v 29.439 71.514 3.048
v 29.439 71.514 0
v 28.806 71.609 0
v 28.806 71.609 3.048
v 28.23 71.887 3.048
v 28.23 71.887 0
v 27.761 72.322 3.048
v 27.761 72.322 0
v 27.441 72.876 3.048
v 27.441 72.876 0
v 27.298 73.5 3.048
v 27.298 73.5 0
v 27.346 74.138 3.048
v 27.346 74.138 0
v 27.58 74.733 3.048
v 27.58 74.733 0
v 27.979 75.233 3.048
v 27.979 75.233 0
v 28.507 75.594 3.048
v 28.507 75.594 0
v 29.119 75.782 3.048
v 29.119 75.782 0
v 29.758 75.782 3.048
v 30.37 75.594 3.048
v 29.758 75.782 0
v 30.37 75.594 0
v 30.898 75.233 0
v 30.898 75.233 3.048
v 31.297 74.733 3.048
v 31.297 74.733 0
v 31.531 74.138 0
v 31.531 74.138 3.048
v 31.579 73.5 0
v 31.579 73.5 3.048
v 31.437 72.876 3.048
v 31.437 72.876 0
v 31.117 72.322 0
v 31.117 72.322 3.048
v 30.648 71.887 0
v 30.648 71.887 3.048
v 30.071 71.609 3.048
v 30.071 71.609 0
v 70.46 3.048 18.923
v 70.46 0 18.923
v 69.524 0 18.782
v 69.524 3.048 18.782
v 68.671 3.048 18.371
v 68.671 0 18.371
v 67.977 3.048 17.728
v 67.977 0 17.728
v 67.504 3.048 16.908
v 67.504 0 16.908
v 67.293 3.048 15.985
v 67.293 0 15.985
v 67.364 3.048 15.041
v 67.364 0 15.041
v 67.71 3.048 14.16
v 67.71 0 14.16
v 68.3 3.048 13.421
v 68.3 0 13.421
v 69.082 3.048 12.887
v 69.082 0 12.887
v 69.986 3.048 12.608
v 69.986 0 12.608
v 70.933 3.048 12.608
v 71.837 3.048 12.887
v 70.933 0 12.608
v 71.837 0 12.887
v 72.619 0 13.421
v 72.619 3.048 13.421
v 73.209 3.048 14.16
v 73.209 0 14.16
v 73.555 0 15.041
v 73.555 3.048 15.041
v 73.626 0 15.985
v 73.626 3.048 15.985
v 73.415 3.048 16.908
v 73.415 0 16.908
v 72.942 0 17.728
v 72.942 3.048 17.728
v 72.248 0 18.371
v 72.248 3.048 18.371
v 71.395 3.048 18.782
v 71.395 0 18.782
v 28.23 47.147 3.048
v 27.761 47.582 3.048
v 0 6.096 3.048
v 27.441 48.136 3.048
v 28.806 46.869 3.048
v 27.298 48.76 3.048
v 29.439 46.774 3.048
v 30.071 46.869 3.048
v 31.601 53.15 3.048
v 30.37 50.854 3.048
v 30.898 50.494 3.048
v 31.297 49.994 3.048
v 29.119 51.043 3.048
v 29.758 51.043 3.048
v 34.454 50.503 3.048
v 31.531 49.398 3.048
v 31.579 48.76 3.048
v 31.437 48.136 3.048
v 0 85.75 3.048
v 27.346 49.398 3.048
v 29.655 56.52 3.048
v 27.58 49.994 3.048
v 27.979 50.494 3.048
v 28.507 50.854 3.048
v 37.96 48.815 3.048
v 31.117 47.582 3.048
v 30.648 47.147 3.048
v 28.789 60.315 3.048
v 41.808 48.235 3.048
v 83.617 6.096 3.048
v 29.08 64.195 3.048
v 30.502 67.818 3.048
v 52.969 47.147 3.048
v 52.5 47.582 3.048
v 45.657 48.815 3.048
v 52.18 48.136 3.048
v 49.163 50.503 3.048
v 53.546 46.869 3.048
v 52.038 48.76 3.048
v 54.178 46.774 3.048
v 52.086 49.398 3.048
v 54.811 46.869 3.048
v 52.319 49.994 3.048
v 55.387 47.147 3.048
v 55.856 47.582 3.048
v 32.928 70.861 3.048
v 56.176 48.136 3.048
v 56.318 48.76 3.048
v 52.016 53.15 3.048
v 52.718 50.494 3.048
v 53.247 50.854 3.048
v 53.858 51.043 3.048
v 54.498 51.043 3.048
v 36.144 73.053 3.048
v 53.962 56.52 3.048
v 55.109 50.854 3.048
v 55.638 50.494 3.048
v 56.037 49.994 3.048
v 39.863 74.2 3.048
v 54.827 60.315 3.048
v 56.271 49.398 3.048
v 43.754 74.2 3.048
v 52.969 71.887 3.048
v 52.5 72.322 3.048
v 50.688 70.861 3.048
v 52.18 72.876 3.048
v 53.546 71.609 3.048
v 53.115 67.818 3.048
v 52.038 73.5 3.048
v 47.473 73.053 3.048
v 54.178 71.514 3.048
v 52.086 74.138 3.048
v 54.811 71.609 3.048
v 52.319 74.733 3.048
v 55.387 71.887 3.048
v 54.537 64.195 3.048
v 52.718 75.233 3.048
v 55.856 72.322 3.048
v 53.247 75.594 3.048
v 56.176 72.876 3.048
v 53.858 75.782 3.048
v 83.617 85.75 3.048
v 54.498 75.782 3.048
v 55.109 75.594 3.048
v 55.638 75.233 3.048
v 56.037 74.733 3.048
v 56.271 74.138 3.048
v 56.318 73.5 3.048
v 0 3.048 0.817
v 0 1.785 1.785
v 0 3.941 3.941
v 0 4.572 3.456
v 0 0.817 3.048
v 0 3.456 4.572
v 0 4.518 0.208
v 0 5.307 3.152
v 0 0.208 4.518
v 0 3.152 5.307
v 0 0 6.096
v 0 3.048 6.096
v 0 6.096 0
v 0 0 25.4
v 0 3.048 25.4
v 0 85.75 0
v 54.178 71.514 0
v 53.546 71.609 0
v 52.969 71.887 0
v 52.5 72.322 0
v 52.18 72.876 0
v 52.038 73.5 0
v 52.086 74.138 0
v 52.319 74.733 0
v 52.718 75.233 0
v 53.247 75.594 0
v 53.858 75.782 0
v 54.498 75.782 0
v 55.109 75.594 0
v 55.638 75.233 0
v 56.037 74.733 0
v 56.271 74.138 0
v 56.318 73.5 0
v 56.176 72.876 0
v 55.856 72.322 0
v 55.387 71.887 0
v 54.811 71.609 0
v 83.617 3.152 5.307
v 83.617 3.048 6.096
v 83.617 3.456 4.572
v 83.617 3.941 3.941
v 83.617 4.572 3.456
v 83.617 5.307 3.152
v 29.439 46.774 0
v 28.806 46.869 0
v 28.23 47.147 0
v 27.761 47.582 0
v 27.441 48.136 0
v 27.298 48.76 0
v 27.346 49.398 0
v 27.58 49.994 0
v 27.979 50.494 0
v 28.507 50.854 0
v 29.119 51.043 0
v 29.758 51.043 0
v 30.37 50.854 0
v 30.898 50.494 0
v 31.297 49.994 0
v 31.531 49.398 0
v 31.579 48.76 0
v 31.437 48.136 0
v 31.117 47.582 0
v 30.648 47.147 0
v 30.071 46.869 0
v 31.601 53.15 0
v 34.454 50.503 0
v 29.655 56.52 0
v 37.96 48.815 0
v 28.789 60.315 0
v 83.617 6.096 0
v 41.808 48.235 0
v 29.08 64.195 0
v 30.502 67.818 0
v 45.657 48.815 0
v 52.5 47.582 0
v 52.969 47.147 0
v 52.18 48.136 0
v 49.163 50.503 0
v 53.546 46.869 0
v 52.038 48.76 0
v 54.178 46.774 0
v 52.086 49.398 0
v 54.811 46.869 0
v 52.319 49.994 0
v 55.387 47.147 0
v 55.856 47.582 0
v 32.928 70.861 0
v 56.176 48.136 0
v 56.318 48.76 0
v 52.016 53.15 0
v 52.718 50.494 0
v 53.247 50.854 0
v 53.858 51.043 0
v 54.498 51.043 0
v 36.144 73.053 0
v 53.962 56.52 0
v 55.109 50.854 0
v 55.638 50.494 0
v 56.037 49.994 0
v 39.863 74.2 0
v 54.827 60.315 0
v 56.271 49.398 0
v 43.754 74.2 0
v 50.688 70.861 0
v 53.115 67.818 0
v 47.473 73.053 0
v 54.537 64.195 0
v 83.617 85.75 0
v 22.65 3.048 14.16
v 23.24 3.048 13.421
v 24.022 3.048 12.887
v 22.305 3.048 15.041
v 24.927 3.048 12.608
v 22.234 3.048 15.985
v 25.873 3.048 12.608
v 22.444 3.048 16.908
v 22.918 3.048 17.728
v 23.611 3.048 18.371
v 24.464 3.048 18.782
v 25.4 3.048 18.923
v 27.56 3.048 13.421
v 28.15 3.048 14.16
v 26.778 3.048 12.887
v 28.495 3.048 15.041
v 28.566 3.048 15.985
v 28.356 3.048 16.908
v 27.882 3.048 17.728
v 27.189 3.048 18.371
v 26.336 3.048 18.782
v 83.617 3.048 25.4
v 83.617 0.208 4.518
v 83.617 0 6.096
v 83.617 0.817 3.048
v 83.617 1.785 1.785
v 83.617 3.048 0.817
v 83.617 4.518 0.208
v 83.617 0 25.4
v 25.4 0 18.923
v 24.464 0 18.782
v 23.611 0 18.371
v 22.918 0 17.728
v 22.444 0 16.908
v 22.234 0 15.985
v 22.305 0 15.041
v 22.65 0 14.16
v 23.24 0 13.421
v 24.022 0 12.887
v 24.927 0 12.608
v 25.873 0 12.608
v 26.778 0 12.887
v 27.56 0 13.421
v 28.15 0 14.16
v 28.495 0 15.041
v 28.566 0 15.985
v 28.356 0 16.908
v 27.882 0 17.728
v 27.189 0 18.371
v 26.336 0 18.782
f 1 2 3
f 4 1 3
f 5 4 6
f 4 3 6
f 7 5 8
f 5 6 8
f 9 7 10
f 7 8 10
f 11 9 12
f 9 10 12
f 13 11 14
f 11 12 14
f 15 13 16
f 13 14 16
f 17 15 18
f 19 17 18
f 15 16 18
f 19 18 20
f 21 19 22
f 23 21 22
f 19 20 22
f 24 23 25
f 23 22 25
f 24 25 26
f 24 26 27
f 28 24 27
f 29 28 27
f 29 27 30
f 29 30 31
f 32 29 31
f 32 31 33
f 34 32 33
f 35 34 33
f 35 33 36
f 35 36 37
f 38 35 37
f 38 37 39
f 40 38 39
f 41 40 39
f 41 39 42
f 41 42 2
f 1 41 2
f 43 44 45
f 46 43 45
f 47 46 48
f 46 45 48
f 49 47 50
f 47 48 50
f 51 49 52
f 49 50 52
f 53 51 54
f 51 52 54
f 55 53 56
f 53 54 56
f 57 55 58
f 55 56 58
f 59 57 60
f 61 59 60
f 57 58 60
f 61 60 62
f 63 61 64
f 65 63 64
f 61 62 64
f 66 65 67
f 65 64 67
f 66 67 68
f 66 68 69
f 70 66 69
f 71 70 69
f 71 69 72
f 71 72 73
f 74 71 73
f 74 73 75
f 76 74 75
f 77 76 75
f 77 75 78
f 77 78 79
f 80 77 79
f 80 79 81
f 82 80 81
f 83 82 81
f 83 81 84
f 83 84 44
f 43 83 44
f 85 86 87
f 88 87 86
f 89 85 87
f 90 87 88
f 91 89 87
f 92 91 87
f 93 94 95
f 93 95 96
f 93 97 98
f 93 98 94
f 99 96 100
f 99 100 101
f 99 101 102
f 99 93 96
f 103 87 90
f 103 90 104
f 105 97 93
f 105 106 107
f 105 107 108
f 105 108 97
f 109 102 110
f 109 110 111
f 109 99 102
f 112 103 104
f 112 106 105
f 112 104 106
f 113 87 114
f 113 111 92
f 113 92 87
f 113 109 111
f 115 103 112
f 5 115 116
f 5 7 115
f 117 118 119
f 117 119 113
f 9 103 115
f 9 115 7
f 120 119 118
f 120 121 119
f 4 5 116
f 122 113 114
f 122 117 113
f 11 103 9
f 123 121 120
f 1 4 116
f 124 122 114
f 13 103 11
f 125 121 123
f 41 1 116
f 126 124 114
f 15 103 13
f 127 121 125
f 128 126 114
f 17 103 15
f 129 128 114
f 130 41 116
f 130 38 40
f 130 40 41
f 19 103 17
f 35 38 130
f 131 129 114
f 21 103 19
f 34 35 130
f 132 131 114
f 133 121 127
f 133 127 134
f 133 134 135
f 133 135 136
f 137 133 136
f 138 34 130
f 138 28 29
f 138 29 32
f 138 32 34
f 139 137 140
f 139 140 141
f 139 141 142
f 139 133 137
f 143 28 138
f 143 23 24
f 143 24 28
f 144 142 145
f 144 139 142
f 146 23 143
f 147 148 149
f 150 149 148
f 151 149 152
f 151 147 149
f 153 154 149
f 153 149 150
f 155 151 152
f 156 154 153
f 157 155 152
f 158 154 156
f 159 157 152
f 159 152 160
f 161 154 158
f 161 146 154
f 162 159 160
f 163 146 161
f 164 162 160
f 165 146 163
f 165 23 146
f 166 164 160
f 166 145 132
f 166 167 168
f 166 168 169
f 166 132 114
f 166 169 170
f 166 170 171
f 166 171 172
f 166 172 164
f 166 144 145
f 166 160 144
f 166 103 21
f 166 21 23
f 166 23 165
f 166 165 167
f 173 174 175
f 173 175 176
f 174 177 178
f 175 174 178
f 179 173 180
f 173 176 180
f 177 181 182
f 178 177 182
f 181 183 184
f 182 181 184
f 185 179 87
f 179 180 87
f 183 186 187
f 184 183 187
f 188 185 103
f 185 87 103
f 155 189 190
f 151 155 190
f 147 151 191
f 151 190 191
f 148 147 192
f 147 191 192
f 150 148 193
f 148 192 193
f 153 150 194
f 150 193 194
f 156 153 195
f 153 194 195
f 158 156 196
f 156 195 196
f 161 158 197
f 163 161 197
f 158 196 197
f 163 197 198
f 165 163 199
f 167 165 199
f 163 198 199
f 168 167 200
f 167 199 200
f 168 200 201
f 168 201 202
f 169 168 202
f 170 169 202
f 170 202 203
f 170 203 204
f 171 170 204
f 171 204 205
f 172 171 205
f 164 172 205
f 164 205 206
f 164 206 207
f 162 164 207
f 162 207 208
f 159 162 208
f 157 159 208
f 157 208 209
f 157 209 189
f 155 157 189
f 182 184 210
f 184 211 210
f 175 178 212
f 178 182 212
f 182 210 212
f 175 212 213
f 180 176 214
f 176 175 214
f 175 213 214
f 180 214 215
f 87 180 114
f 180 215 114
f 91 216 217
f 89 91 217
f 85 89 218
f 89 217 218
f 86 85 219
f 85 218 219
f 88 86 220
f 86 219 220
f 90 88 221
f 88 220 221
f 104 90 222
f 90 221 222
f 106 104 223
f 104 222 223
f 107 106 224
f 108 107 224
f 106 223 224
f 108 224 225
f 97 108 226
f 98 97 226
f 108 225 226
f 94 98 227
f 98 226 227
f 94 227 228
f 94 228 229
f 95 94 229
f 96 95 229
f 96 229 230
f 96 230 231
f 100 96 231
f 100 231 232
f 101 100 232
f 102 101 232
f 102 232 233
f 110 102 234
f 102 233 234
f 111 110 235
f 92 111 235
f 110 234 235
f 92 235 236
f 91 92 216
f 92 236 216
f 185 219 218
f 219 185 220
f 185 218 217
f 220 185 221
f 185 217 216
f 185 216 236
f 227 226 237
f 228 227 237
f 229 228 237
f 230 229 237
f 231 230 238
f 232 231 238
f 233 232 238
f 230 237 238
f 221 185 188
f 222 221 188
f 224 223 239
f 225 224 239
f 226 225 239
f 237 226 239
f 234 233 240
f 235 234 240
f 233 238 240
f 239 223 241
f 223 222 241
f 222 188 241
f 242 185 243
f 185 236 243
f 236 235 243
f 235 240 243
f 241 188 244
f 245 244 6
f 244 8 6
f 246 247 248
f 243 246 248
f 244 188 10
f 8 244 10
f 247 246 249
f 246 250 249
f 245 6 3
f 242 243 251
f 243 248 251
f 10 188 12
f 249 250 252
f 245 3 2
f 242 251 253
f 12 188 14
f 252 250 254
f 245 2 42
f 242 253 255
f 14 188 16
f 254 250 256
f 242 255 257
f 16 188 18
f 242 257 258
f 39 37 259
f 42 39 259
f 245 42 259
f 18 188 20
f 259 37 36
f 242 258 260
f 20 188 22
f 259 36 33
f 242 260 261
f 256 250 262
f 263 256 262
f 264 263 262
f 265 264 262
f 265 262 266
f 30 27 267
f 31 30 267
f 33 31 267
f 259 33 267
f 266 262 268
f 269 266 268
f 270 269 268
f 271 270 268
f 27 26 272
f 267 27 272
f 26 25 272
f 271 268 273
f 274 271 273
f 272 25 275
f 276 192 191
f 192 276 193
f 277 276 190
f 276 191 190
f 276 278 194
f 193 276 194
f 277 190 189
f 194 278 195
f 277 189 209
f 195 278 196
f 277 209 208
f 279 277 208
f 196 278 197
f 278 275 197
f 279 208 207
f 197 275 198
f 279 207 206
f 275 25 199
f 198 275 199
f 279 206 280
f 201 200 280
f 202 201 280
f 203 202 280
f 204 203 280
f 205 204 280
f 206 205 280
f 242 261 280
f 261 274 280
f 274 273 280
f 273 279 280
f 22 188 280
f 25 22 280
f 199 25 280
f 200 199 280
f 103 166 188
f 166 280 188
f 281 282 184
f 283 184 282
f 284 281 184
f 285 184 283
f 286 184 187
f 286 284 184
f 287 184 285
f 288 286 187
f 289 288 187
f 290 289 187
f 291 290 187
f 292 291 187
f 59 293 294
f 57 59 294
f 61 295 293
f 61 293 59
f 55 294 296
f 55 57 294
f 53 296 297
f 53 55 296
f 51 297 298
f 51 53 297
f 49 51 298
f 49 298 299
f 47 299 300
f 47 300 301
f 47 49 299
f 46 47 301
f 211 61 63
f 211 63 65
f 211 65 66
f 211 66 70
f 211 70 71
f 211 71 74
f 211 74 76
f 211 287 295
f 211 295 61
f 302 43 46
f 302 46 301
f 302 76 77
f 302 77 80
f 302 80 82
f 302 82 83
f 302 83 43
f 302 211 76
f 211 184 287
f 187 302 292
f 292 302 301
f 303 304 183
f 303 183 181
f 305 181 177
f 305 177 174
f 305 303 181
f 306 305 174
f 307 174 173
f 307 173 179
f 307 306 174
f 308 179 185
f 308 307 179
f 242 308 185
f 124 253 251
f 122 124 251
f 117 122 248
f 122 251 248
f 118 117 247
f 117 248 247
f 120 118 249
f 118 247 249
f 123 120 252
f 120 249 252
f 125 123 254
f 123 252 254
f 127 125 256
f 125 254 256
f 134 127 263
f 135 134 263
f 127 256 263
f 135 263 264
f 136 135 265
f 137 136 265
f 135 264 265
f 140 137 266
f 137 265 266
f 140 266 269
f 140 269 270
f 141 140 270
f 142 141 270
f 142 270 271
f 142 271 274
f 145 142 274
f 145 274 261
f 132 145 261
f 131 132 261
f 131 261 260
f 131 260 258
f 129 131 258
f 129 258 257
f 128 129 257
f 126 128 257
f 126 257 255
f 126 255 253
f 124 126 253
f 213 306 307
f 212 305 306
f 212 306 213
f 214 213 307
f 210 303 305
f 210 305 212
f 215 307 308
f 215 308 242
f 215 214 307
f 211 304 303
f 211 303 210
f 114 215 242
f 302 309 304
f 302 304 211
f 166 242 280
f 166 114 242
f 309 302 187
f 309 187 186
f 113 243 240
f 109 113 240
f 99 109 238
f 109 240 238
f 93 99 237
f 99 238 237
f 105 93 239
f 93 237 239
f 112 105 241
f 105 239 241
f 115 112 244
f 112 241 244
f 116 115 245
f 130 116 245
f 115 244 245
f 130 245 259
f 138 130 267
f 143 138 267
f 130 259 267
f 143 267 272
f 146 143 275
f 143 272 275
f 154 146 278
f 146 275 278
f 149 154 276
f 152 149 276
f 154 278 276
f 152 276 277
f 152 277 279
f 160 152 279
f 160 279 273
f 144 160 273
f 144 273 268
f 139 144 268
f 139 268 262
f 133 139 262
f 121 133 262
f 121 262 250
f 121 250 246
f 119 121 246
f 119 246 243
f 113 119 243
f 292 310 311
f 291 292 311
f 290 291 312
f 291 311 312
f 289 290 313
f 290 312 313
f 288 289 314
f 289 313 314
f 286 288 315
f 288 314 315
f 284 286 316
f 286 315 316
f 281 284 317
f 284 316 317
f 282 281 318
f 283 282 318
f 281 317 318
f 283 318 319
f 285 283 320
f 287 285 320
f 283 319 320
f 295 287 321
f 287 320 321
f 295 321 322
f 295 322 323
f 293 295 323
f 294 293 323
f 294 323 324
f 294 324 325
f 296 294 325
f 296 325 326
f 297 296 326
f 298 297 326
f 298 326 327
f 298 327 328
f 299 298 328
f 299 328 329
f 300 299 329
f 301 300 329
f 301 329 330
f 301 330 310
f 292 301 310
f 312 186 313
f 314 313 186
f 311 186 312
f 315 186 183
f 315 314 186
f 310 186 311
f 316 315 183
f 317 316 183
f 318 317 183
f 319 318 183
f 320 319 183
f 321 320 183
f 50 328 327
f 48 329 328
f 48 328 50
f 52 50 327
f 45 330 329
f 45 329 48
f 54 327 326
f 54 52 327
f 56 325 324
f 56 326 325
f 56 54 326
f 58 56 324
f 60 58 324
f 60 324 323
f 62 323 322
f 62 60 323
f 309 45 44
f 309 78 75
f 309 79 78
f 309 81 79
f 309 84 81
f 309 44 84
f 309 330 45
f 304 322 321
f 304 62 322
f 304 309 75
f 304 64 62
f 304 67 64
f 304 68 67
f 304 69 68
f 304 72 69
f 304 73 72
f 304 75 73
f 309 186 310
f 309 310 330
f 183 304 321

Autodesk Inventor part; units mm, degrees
ref_plane "YZ Plane" through (0, 0, 0) normal (1, 0, 0) x (0, 1, 0)
ref_plane "XZ Plane" through (0, 0, 0) normal (0, 1, 0) x (-1, 0, 0)
ref_plane "XY Plane" through (0, 0, 0) normal (0, 0, 1) x (1, 0, 0)
sketch "Sketch1" plane through (0, 0, 0) normal (0, 0, 1) x (1, 0, 0)
  line L0 (0, 0) -> (83.6168, 0)
  line L1 (83.6168, 0) -> (83.6168, 85.7504)
  line L2 (83.6168, 85.7504) -> (0, 85.7504)
  line L3 (0, 85.7504) -> (0, 0)
  dimension "d0" = 83.6168
  dimension "d1" = 85.7504
extrude "Plate1" add sketch "Sketch1" along normal blind 3.048
sketch "Sketch2" plane through (83.6168, 3.048, 0) normal (0, -1, 0) x (1, 0, 0)
  line L0 (-83.6168, 0) -> (0, 0)
  line L1 (0, 0) -> (0, 25.4)
  line L2 (0, 25.4) -> (-83.6168, 25.4)
  line L3 (-83.6168, 25.4) -> (-83.6168, 0)
edge flange "Flange1" height 25.4 angle 90 thickness 3.048 bend radius 3.048 thickness toward (0, -1, 0) relief tear relief width 3.048 relief depth 1.524 edges at (41.8084, 0, 3.048) wall of the first edge with corners at (0, 3.048, 0) (83.6168, 3.048, 0) (83.6168, 3.048, 25.4) (0, 3.048, 25.4)
bend "Bend1"
corner "Corner1"
sketch "Sketch3" plane through (0, 0, 3.048) normal (0, 0, 1) x (1, 0, 0)
  line L0 (83.6168, 85.7504) -> (83.6168, 6.096) projected
  line L1 (0, 0) -> (83.6168, 0) projected
  point P0 (41.8084, 61.2902)
  dimension "d13" = 61.2902
  dimension "d14" = 41.8084
hole "Hole1" at (41.8084, 61.2902, 3.048) direction (0, 0, -1) diameter 26.1112 depth 3.048 tip angle 118
sketch "Sketch4" plane through (0, 0, 3.048) normal (0, 0, 1) x (1, 0, 0)
  circle A0 centre (41.8084, 61.2902) radius 13.0556 projected
  point P0 (0, 0)
  point P1 (29.4386, 73.66)
  point P2 (54.1782, 73.66)
  point P3 (54.1782, 48.9204)
  point P4 (29.4386, 48.9204)
  dimension "d23" = 12.3698
  dimension "d24" = 12.3698
  dimension "d25" = 12.3698
  dimension "d26" = 12.3698
  dimension "d27" = 12.3698
  dimension "d28" = 12.3698
  dimension "d29" = 12.3698
  dimension "d30" = 12.3698
hole "Hole2" at (29.4386, 73.66, 3.048) at (54.1782, 73.66, 3.048) at (54.1782, 48.9204, 3.048) at (29.4386, 48.9204, 3.048) direction (0, 0, -1) diameter 4.2926 depth 3.048 tip angle 118
sketch "Sketch5" plane through (0, 3.048, 25.4) normal (0, 1, 0) x (1, 0, 0)
  line L0 (0, 0) -> (0, 19.304) projected
  point P0 (0, 25.4)
  point P1 (25.4, 9.652)
  point P2 (70.4595, 9.652)
  dimension "d39" = 25.4
hole "Hole3" at (25.4, 3.048, 15.748) at (70.4595, 3.048, 15.748) direction (0, -1, 0) diameter 6.35 end through all
equation "\"d20\" = Thickness"
equation "\"d36\" = Thickness"
equation "\"d45\" = Thickness"
equation "\"d3\" = BendReliefWidth"
equation "\"d4\" = BendReliefDepth"
equation "\"d5\" = MinimumRemnant"
equation "\"d6\" = BendRadius"
equation "\"d9\" = BendRadius"
equation "\"d10\" = CornerReliefSize"
equation "\"d11\" = GapSize"
equation "\"d12\" = JacobiRadiusSize"
equation "\"BendRadius\" = Thickness"
equation "\"BendReliefWidth\" = Thickness"
equation "\"BendReliefDepth\" = 0.5 * Thickness"
equation "\"CornerReliefSize\" = 4 * Thickness"
equation "\"MinimumRemnant\" = 2 * Thickness"
equation "\"TransitionRadius\" = BendRadius"
equation "\"JacobiRadiusSize\" = BendRadius"
equation "\"GapSize\" = Thickness"
equation "\"d2\" = BendRadius"
equation "\"Thickness\" = 3.048"
